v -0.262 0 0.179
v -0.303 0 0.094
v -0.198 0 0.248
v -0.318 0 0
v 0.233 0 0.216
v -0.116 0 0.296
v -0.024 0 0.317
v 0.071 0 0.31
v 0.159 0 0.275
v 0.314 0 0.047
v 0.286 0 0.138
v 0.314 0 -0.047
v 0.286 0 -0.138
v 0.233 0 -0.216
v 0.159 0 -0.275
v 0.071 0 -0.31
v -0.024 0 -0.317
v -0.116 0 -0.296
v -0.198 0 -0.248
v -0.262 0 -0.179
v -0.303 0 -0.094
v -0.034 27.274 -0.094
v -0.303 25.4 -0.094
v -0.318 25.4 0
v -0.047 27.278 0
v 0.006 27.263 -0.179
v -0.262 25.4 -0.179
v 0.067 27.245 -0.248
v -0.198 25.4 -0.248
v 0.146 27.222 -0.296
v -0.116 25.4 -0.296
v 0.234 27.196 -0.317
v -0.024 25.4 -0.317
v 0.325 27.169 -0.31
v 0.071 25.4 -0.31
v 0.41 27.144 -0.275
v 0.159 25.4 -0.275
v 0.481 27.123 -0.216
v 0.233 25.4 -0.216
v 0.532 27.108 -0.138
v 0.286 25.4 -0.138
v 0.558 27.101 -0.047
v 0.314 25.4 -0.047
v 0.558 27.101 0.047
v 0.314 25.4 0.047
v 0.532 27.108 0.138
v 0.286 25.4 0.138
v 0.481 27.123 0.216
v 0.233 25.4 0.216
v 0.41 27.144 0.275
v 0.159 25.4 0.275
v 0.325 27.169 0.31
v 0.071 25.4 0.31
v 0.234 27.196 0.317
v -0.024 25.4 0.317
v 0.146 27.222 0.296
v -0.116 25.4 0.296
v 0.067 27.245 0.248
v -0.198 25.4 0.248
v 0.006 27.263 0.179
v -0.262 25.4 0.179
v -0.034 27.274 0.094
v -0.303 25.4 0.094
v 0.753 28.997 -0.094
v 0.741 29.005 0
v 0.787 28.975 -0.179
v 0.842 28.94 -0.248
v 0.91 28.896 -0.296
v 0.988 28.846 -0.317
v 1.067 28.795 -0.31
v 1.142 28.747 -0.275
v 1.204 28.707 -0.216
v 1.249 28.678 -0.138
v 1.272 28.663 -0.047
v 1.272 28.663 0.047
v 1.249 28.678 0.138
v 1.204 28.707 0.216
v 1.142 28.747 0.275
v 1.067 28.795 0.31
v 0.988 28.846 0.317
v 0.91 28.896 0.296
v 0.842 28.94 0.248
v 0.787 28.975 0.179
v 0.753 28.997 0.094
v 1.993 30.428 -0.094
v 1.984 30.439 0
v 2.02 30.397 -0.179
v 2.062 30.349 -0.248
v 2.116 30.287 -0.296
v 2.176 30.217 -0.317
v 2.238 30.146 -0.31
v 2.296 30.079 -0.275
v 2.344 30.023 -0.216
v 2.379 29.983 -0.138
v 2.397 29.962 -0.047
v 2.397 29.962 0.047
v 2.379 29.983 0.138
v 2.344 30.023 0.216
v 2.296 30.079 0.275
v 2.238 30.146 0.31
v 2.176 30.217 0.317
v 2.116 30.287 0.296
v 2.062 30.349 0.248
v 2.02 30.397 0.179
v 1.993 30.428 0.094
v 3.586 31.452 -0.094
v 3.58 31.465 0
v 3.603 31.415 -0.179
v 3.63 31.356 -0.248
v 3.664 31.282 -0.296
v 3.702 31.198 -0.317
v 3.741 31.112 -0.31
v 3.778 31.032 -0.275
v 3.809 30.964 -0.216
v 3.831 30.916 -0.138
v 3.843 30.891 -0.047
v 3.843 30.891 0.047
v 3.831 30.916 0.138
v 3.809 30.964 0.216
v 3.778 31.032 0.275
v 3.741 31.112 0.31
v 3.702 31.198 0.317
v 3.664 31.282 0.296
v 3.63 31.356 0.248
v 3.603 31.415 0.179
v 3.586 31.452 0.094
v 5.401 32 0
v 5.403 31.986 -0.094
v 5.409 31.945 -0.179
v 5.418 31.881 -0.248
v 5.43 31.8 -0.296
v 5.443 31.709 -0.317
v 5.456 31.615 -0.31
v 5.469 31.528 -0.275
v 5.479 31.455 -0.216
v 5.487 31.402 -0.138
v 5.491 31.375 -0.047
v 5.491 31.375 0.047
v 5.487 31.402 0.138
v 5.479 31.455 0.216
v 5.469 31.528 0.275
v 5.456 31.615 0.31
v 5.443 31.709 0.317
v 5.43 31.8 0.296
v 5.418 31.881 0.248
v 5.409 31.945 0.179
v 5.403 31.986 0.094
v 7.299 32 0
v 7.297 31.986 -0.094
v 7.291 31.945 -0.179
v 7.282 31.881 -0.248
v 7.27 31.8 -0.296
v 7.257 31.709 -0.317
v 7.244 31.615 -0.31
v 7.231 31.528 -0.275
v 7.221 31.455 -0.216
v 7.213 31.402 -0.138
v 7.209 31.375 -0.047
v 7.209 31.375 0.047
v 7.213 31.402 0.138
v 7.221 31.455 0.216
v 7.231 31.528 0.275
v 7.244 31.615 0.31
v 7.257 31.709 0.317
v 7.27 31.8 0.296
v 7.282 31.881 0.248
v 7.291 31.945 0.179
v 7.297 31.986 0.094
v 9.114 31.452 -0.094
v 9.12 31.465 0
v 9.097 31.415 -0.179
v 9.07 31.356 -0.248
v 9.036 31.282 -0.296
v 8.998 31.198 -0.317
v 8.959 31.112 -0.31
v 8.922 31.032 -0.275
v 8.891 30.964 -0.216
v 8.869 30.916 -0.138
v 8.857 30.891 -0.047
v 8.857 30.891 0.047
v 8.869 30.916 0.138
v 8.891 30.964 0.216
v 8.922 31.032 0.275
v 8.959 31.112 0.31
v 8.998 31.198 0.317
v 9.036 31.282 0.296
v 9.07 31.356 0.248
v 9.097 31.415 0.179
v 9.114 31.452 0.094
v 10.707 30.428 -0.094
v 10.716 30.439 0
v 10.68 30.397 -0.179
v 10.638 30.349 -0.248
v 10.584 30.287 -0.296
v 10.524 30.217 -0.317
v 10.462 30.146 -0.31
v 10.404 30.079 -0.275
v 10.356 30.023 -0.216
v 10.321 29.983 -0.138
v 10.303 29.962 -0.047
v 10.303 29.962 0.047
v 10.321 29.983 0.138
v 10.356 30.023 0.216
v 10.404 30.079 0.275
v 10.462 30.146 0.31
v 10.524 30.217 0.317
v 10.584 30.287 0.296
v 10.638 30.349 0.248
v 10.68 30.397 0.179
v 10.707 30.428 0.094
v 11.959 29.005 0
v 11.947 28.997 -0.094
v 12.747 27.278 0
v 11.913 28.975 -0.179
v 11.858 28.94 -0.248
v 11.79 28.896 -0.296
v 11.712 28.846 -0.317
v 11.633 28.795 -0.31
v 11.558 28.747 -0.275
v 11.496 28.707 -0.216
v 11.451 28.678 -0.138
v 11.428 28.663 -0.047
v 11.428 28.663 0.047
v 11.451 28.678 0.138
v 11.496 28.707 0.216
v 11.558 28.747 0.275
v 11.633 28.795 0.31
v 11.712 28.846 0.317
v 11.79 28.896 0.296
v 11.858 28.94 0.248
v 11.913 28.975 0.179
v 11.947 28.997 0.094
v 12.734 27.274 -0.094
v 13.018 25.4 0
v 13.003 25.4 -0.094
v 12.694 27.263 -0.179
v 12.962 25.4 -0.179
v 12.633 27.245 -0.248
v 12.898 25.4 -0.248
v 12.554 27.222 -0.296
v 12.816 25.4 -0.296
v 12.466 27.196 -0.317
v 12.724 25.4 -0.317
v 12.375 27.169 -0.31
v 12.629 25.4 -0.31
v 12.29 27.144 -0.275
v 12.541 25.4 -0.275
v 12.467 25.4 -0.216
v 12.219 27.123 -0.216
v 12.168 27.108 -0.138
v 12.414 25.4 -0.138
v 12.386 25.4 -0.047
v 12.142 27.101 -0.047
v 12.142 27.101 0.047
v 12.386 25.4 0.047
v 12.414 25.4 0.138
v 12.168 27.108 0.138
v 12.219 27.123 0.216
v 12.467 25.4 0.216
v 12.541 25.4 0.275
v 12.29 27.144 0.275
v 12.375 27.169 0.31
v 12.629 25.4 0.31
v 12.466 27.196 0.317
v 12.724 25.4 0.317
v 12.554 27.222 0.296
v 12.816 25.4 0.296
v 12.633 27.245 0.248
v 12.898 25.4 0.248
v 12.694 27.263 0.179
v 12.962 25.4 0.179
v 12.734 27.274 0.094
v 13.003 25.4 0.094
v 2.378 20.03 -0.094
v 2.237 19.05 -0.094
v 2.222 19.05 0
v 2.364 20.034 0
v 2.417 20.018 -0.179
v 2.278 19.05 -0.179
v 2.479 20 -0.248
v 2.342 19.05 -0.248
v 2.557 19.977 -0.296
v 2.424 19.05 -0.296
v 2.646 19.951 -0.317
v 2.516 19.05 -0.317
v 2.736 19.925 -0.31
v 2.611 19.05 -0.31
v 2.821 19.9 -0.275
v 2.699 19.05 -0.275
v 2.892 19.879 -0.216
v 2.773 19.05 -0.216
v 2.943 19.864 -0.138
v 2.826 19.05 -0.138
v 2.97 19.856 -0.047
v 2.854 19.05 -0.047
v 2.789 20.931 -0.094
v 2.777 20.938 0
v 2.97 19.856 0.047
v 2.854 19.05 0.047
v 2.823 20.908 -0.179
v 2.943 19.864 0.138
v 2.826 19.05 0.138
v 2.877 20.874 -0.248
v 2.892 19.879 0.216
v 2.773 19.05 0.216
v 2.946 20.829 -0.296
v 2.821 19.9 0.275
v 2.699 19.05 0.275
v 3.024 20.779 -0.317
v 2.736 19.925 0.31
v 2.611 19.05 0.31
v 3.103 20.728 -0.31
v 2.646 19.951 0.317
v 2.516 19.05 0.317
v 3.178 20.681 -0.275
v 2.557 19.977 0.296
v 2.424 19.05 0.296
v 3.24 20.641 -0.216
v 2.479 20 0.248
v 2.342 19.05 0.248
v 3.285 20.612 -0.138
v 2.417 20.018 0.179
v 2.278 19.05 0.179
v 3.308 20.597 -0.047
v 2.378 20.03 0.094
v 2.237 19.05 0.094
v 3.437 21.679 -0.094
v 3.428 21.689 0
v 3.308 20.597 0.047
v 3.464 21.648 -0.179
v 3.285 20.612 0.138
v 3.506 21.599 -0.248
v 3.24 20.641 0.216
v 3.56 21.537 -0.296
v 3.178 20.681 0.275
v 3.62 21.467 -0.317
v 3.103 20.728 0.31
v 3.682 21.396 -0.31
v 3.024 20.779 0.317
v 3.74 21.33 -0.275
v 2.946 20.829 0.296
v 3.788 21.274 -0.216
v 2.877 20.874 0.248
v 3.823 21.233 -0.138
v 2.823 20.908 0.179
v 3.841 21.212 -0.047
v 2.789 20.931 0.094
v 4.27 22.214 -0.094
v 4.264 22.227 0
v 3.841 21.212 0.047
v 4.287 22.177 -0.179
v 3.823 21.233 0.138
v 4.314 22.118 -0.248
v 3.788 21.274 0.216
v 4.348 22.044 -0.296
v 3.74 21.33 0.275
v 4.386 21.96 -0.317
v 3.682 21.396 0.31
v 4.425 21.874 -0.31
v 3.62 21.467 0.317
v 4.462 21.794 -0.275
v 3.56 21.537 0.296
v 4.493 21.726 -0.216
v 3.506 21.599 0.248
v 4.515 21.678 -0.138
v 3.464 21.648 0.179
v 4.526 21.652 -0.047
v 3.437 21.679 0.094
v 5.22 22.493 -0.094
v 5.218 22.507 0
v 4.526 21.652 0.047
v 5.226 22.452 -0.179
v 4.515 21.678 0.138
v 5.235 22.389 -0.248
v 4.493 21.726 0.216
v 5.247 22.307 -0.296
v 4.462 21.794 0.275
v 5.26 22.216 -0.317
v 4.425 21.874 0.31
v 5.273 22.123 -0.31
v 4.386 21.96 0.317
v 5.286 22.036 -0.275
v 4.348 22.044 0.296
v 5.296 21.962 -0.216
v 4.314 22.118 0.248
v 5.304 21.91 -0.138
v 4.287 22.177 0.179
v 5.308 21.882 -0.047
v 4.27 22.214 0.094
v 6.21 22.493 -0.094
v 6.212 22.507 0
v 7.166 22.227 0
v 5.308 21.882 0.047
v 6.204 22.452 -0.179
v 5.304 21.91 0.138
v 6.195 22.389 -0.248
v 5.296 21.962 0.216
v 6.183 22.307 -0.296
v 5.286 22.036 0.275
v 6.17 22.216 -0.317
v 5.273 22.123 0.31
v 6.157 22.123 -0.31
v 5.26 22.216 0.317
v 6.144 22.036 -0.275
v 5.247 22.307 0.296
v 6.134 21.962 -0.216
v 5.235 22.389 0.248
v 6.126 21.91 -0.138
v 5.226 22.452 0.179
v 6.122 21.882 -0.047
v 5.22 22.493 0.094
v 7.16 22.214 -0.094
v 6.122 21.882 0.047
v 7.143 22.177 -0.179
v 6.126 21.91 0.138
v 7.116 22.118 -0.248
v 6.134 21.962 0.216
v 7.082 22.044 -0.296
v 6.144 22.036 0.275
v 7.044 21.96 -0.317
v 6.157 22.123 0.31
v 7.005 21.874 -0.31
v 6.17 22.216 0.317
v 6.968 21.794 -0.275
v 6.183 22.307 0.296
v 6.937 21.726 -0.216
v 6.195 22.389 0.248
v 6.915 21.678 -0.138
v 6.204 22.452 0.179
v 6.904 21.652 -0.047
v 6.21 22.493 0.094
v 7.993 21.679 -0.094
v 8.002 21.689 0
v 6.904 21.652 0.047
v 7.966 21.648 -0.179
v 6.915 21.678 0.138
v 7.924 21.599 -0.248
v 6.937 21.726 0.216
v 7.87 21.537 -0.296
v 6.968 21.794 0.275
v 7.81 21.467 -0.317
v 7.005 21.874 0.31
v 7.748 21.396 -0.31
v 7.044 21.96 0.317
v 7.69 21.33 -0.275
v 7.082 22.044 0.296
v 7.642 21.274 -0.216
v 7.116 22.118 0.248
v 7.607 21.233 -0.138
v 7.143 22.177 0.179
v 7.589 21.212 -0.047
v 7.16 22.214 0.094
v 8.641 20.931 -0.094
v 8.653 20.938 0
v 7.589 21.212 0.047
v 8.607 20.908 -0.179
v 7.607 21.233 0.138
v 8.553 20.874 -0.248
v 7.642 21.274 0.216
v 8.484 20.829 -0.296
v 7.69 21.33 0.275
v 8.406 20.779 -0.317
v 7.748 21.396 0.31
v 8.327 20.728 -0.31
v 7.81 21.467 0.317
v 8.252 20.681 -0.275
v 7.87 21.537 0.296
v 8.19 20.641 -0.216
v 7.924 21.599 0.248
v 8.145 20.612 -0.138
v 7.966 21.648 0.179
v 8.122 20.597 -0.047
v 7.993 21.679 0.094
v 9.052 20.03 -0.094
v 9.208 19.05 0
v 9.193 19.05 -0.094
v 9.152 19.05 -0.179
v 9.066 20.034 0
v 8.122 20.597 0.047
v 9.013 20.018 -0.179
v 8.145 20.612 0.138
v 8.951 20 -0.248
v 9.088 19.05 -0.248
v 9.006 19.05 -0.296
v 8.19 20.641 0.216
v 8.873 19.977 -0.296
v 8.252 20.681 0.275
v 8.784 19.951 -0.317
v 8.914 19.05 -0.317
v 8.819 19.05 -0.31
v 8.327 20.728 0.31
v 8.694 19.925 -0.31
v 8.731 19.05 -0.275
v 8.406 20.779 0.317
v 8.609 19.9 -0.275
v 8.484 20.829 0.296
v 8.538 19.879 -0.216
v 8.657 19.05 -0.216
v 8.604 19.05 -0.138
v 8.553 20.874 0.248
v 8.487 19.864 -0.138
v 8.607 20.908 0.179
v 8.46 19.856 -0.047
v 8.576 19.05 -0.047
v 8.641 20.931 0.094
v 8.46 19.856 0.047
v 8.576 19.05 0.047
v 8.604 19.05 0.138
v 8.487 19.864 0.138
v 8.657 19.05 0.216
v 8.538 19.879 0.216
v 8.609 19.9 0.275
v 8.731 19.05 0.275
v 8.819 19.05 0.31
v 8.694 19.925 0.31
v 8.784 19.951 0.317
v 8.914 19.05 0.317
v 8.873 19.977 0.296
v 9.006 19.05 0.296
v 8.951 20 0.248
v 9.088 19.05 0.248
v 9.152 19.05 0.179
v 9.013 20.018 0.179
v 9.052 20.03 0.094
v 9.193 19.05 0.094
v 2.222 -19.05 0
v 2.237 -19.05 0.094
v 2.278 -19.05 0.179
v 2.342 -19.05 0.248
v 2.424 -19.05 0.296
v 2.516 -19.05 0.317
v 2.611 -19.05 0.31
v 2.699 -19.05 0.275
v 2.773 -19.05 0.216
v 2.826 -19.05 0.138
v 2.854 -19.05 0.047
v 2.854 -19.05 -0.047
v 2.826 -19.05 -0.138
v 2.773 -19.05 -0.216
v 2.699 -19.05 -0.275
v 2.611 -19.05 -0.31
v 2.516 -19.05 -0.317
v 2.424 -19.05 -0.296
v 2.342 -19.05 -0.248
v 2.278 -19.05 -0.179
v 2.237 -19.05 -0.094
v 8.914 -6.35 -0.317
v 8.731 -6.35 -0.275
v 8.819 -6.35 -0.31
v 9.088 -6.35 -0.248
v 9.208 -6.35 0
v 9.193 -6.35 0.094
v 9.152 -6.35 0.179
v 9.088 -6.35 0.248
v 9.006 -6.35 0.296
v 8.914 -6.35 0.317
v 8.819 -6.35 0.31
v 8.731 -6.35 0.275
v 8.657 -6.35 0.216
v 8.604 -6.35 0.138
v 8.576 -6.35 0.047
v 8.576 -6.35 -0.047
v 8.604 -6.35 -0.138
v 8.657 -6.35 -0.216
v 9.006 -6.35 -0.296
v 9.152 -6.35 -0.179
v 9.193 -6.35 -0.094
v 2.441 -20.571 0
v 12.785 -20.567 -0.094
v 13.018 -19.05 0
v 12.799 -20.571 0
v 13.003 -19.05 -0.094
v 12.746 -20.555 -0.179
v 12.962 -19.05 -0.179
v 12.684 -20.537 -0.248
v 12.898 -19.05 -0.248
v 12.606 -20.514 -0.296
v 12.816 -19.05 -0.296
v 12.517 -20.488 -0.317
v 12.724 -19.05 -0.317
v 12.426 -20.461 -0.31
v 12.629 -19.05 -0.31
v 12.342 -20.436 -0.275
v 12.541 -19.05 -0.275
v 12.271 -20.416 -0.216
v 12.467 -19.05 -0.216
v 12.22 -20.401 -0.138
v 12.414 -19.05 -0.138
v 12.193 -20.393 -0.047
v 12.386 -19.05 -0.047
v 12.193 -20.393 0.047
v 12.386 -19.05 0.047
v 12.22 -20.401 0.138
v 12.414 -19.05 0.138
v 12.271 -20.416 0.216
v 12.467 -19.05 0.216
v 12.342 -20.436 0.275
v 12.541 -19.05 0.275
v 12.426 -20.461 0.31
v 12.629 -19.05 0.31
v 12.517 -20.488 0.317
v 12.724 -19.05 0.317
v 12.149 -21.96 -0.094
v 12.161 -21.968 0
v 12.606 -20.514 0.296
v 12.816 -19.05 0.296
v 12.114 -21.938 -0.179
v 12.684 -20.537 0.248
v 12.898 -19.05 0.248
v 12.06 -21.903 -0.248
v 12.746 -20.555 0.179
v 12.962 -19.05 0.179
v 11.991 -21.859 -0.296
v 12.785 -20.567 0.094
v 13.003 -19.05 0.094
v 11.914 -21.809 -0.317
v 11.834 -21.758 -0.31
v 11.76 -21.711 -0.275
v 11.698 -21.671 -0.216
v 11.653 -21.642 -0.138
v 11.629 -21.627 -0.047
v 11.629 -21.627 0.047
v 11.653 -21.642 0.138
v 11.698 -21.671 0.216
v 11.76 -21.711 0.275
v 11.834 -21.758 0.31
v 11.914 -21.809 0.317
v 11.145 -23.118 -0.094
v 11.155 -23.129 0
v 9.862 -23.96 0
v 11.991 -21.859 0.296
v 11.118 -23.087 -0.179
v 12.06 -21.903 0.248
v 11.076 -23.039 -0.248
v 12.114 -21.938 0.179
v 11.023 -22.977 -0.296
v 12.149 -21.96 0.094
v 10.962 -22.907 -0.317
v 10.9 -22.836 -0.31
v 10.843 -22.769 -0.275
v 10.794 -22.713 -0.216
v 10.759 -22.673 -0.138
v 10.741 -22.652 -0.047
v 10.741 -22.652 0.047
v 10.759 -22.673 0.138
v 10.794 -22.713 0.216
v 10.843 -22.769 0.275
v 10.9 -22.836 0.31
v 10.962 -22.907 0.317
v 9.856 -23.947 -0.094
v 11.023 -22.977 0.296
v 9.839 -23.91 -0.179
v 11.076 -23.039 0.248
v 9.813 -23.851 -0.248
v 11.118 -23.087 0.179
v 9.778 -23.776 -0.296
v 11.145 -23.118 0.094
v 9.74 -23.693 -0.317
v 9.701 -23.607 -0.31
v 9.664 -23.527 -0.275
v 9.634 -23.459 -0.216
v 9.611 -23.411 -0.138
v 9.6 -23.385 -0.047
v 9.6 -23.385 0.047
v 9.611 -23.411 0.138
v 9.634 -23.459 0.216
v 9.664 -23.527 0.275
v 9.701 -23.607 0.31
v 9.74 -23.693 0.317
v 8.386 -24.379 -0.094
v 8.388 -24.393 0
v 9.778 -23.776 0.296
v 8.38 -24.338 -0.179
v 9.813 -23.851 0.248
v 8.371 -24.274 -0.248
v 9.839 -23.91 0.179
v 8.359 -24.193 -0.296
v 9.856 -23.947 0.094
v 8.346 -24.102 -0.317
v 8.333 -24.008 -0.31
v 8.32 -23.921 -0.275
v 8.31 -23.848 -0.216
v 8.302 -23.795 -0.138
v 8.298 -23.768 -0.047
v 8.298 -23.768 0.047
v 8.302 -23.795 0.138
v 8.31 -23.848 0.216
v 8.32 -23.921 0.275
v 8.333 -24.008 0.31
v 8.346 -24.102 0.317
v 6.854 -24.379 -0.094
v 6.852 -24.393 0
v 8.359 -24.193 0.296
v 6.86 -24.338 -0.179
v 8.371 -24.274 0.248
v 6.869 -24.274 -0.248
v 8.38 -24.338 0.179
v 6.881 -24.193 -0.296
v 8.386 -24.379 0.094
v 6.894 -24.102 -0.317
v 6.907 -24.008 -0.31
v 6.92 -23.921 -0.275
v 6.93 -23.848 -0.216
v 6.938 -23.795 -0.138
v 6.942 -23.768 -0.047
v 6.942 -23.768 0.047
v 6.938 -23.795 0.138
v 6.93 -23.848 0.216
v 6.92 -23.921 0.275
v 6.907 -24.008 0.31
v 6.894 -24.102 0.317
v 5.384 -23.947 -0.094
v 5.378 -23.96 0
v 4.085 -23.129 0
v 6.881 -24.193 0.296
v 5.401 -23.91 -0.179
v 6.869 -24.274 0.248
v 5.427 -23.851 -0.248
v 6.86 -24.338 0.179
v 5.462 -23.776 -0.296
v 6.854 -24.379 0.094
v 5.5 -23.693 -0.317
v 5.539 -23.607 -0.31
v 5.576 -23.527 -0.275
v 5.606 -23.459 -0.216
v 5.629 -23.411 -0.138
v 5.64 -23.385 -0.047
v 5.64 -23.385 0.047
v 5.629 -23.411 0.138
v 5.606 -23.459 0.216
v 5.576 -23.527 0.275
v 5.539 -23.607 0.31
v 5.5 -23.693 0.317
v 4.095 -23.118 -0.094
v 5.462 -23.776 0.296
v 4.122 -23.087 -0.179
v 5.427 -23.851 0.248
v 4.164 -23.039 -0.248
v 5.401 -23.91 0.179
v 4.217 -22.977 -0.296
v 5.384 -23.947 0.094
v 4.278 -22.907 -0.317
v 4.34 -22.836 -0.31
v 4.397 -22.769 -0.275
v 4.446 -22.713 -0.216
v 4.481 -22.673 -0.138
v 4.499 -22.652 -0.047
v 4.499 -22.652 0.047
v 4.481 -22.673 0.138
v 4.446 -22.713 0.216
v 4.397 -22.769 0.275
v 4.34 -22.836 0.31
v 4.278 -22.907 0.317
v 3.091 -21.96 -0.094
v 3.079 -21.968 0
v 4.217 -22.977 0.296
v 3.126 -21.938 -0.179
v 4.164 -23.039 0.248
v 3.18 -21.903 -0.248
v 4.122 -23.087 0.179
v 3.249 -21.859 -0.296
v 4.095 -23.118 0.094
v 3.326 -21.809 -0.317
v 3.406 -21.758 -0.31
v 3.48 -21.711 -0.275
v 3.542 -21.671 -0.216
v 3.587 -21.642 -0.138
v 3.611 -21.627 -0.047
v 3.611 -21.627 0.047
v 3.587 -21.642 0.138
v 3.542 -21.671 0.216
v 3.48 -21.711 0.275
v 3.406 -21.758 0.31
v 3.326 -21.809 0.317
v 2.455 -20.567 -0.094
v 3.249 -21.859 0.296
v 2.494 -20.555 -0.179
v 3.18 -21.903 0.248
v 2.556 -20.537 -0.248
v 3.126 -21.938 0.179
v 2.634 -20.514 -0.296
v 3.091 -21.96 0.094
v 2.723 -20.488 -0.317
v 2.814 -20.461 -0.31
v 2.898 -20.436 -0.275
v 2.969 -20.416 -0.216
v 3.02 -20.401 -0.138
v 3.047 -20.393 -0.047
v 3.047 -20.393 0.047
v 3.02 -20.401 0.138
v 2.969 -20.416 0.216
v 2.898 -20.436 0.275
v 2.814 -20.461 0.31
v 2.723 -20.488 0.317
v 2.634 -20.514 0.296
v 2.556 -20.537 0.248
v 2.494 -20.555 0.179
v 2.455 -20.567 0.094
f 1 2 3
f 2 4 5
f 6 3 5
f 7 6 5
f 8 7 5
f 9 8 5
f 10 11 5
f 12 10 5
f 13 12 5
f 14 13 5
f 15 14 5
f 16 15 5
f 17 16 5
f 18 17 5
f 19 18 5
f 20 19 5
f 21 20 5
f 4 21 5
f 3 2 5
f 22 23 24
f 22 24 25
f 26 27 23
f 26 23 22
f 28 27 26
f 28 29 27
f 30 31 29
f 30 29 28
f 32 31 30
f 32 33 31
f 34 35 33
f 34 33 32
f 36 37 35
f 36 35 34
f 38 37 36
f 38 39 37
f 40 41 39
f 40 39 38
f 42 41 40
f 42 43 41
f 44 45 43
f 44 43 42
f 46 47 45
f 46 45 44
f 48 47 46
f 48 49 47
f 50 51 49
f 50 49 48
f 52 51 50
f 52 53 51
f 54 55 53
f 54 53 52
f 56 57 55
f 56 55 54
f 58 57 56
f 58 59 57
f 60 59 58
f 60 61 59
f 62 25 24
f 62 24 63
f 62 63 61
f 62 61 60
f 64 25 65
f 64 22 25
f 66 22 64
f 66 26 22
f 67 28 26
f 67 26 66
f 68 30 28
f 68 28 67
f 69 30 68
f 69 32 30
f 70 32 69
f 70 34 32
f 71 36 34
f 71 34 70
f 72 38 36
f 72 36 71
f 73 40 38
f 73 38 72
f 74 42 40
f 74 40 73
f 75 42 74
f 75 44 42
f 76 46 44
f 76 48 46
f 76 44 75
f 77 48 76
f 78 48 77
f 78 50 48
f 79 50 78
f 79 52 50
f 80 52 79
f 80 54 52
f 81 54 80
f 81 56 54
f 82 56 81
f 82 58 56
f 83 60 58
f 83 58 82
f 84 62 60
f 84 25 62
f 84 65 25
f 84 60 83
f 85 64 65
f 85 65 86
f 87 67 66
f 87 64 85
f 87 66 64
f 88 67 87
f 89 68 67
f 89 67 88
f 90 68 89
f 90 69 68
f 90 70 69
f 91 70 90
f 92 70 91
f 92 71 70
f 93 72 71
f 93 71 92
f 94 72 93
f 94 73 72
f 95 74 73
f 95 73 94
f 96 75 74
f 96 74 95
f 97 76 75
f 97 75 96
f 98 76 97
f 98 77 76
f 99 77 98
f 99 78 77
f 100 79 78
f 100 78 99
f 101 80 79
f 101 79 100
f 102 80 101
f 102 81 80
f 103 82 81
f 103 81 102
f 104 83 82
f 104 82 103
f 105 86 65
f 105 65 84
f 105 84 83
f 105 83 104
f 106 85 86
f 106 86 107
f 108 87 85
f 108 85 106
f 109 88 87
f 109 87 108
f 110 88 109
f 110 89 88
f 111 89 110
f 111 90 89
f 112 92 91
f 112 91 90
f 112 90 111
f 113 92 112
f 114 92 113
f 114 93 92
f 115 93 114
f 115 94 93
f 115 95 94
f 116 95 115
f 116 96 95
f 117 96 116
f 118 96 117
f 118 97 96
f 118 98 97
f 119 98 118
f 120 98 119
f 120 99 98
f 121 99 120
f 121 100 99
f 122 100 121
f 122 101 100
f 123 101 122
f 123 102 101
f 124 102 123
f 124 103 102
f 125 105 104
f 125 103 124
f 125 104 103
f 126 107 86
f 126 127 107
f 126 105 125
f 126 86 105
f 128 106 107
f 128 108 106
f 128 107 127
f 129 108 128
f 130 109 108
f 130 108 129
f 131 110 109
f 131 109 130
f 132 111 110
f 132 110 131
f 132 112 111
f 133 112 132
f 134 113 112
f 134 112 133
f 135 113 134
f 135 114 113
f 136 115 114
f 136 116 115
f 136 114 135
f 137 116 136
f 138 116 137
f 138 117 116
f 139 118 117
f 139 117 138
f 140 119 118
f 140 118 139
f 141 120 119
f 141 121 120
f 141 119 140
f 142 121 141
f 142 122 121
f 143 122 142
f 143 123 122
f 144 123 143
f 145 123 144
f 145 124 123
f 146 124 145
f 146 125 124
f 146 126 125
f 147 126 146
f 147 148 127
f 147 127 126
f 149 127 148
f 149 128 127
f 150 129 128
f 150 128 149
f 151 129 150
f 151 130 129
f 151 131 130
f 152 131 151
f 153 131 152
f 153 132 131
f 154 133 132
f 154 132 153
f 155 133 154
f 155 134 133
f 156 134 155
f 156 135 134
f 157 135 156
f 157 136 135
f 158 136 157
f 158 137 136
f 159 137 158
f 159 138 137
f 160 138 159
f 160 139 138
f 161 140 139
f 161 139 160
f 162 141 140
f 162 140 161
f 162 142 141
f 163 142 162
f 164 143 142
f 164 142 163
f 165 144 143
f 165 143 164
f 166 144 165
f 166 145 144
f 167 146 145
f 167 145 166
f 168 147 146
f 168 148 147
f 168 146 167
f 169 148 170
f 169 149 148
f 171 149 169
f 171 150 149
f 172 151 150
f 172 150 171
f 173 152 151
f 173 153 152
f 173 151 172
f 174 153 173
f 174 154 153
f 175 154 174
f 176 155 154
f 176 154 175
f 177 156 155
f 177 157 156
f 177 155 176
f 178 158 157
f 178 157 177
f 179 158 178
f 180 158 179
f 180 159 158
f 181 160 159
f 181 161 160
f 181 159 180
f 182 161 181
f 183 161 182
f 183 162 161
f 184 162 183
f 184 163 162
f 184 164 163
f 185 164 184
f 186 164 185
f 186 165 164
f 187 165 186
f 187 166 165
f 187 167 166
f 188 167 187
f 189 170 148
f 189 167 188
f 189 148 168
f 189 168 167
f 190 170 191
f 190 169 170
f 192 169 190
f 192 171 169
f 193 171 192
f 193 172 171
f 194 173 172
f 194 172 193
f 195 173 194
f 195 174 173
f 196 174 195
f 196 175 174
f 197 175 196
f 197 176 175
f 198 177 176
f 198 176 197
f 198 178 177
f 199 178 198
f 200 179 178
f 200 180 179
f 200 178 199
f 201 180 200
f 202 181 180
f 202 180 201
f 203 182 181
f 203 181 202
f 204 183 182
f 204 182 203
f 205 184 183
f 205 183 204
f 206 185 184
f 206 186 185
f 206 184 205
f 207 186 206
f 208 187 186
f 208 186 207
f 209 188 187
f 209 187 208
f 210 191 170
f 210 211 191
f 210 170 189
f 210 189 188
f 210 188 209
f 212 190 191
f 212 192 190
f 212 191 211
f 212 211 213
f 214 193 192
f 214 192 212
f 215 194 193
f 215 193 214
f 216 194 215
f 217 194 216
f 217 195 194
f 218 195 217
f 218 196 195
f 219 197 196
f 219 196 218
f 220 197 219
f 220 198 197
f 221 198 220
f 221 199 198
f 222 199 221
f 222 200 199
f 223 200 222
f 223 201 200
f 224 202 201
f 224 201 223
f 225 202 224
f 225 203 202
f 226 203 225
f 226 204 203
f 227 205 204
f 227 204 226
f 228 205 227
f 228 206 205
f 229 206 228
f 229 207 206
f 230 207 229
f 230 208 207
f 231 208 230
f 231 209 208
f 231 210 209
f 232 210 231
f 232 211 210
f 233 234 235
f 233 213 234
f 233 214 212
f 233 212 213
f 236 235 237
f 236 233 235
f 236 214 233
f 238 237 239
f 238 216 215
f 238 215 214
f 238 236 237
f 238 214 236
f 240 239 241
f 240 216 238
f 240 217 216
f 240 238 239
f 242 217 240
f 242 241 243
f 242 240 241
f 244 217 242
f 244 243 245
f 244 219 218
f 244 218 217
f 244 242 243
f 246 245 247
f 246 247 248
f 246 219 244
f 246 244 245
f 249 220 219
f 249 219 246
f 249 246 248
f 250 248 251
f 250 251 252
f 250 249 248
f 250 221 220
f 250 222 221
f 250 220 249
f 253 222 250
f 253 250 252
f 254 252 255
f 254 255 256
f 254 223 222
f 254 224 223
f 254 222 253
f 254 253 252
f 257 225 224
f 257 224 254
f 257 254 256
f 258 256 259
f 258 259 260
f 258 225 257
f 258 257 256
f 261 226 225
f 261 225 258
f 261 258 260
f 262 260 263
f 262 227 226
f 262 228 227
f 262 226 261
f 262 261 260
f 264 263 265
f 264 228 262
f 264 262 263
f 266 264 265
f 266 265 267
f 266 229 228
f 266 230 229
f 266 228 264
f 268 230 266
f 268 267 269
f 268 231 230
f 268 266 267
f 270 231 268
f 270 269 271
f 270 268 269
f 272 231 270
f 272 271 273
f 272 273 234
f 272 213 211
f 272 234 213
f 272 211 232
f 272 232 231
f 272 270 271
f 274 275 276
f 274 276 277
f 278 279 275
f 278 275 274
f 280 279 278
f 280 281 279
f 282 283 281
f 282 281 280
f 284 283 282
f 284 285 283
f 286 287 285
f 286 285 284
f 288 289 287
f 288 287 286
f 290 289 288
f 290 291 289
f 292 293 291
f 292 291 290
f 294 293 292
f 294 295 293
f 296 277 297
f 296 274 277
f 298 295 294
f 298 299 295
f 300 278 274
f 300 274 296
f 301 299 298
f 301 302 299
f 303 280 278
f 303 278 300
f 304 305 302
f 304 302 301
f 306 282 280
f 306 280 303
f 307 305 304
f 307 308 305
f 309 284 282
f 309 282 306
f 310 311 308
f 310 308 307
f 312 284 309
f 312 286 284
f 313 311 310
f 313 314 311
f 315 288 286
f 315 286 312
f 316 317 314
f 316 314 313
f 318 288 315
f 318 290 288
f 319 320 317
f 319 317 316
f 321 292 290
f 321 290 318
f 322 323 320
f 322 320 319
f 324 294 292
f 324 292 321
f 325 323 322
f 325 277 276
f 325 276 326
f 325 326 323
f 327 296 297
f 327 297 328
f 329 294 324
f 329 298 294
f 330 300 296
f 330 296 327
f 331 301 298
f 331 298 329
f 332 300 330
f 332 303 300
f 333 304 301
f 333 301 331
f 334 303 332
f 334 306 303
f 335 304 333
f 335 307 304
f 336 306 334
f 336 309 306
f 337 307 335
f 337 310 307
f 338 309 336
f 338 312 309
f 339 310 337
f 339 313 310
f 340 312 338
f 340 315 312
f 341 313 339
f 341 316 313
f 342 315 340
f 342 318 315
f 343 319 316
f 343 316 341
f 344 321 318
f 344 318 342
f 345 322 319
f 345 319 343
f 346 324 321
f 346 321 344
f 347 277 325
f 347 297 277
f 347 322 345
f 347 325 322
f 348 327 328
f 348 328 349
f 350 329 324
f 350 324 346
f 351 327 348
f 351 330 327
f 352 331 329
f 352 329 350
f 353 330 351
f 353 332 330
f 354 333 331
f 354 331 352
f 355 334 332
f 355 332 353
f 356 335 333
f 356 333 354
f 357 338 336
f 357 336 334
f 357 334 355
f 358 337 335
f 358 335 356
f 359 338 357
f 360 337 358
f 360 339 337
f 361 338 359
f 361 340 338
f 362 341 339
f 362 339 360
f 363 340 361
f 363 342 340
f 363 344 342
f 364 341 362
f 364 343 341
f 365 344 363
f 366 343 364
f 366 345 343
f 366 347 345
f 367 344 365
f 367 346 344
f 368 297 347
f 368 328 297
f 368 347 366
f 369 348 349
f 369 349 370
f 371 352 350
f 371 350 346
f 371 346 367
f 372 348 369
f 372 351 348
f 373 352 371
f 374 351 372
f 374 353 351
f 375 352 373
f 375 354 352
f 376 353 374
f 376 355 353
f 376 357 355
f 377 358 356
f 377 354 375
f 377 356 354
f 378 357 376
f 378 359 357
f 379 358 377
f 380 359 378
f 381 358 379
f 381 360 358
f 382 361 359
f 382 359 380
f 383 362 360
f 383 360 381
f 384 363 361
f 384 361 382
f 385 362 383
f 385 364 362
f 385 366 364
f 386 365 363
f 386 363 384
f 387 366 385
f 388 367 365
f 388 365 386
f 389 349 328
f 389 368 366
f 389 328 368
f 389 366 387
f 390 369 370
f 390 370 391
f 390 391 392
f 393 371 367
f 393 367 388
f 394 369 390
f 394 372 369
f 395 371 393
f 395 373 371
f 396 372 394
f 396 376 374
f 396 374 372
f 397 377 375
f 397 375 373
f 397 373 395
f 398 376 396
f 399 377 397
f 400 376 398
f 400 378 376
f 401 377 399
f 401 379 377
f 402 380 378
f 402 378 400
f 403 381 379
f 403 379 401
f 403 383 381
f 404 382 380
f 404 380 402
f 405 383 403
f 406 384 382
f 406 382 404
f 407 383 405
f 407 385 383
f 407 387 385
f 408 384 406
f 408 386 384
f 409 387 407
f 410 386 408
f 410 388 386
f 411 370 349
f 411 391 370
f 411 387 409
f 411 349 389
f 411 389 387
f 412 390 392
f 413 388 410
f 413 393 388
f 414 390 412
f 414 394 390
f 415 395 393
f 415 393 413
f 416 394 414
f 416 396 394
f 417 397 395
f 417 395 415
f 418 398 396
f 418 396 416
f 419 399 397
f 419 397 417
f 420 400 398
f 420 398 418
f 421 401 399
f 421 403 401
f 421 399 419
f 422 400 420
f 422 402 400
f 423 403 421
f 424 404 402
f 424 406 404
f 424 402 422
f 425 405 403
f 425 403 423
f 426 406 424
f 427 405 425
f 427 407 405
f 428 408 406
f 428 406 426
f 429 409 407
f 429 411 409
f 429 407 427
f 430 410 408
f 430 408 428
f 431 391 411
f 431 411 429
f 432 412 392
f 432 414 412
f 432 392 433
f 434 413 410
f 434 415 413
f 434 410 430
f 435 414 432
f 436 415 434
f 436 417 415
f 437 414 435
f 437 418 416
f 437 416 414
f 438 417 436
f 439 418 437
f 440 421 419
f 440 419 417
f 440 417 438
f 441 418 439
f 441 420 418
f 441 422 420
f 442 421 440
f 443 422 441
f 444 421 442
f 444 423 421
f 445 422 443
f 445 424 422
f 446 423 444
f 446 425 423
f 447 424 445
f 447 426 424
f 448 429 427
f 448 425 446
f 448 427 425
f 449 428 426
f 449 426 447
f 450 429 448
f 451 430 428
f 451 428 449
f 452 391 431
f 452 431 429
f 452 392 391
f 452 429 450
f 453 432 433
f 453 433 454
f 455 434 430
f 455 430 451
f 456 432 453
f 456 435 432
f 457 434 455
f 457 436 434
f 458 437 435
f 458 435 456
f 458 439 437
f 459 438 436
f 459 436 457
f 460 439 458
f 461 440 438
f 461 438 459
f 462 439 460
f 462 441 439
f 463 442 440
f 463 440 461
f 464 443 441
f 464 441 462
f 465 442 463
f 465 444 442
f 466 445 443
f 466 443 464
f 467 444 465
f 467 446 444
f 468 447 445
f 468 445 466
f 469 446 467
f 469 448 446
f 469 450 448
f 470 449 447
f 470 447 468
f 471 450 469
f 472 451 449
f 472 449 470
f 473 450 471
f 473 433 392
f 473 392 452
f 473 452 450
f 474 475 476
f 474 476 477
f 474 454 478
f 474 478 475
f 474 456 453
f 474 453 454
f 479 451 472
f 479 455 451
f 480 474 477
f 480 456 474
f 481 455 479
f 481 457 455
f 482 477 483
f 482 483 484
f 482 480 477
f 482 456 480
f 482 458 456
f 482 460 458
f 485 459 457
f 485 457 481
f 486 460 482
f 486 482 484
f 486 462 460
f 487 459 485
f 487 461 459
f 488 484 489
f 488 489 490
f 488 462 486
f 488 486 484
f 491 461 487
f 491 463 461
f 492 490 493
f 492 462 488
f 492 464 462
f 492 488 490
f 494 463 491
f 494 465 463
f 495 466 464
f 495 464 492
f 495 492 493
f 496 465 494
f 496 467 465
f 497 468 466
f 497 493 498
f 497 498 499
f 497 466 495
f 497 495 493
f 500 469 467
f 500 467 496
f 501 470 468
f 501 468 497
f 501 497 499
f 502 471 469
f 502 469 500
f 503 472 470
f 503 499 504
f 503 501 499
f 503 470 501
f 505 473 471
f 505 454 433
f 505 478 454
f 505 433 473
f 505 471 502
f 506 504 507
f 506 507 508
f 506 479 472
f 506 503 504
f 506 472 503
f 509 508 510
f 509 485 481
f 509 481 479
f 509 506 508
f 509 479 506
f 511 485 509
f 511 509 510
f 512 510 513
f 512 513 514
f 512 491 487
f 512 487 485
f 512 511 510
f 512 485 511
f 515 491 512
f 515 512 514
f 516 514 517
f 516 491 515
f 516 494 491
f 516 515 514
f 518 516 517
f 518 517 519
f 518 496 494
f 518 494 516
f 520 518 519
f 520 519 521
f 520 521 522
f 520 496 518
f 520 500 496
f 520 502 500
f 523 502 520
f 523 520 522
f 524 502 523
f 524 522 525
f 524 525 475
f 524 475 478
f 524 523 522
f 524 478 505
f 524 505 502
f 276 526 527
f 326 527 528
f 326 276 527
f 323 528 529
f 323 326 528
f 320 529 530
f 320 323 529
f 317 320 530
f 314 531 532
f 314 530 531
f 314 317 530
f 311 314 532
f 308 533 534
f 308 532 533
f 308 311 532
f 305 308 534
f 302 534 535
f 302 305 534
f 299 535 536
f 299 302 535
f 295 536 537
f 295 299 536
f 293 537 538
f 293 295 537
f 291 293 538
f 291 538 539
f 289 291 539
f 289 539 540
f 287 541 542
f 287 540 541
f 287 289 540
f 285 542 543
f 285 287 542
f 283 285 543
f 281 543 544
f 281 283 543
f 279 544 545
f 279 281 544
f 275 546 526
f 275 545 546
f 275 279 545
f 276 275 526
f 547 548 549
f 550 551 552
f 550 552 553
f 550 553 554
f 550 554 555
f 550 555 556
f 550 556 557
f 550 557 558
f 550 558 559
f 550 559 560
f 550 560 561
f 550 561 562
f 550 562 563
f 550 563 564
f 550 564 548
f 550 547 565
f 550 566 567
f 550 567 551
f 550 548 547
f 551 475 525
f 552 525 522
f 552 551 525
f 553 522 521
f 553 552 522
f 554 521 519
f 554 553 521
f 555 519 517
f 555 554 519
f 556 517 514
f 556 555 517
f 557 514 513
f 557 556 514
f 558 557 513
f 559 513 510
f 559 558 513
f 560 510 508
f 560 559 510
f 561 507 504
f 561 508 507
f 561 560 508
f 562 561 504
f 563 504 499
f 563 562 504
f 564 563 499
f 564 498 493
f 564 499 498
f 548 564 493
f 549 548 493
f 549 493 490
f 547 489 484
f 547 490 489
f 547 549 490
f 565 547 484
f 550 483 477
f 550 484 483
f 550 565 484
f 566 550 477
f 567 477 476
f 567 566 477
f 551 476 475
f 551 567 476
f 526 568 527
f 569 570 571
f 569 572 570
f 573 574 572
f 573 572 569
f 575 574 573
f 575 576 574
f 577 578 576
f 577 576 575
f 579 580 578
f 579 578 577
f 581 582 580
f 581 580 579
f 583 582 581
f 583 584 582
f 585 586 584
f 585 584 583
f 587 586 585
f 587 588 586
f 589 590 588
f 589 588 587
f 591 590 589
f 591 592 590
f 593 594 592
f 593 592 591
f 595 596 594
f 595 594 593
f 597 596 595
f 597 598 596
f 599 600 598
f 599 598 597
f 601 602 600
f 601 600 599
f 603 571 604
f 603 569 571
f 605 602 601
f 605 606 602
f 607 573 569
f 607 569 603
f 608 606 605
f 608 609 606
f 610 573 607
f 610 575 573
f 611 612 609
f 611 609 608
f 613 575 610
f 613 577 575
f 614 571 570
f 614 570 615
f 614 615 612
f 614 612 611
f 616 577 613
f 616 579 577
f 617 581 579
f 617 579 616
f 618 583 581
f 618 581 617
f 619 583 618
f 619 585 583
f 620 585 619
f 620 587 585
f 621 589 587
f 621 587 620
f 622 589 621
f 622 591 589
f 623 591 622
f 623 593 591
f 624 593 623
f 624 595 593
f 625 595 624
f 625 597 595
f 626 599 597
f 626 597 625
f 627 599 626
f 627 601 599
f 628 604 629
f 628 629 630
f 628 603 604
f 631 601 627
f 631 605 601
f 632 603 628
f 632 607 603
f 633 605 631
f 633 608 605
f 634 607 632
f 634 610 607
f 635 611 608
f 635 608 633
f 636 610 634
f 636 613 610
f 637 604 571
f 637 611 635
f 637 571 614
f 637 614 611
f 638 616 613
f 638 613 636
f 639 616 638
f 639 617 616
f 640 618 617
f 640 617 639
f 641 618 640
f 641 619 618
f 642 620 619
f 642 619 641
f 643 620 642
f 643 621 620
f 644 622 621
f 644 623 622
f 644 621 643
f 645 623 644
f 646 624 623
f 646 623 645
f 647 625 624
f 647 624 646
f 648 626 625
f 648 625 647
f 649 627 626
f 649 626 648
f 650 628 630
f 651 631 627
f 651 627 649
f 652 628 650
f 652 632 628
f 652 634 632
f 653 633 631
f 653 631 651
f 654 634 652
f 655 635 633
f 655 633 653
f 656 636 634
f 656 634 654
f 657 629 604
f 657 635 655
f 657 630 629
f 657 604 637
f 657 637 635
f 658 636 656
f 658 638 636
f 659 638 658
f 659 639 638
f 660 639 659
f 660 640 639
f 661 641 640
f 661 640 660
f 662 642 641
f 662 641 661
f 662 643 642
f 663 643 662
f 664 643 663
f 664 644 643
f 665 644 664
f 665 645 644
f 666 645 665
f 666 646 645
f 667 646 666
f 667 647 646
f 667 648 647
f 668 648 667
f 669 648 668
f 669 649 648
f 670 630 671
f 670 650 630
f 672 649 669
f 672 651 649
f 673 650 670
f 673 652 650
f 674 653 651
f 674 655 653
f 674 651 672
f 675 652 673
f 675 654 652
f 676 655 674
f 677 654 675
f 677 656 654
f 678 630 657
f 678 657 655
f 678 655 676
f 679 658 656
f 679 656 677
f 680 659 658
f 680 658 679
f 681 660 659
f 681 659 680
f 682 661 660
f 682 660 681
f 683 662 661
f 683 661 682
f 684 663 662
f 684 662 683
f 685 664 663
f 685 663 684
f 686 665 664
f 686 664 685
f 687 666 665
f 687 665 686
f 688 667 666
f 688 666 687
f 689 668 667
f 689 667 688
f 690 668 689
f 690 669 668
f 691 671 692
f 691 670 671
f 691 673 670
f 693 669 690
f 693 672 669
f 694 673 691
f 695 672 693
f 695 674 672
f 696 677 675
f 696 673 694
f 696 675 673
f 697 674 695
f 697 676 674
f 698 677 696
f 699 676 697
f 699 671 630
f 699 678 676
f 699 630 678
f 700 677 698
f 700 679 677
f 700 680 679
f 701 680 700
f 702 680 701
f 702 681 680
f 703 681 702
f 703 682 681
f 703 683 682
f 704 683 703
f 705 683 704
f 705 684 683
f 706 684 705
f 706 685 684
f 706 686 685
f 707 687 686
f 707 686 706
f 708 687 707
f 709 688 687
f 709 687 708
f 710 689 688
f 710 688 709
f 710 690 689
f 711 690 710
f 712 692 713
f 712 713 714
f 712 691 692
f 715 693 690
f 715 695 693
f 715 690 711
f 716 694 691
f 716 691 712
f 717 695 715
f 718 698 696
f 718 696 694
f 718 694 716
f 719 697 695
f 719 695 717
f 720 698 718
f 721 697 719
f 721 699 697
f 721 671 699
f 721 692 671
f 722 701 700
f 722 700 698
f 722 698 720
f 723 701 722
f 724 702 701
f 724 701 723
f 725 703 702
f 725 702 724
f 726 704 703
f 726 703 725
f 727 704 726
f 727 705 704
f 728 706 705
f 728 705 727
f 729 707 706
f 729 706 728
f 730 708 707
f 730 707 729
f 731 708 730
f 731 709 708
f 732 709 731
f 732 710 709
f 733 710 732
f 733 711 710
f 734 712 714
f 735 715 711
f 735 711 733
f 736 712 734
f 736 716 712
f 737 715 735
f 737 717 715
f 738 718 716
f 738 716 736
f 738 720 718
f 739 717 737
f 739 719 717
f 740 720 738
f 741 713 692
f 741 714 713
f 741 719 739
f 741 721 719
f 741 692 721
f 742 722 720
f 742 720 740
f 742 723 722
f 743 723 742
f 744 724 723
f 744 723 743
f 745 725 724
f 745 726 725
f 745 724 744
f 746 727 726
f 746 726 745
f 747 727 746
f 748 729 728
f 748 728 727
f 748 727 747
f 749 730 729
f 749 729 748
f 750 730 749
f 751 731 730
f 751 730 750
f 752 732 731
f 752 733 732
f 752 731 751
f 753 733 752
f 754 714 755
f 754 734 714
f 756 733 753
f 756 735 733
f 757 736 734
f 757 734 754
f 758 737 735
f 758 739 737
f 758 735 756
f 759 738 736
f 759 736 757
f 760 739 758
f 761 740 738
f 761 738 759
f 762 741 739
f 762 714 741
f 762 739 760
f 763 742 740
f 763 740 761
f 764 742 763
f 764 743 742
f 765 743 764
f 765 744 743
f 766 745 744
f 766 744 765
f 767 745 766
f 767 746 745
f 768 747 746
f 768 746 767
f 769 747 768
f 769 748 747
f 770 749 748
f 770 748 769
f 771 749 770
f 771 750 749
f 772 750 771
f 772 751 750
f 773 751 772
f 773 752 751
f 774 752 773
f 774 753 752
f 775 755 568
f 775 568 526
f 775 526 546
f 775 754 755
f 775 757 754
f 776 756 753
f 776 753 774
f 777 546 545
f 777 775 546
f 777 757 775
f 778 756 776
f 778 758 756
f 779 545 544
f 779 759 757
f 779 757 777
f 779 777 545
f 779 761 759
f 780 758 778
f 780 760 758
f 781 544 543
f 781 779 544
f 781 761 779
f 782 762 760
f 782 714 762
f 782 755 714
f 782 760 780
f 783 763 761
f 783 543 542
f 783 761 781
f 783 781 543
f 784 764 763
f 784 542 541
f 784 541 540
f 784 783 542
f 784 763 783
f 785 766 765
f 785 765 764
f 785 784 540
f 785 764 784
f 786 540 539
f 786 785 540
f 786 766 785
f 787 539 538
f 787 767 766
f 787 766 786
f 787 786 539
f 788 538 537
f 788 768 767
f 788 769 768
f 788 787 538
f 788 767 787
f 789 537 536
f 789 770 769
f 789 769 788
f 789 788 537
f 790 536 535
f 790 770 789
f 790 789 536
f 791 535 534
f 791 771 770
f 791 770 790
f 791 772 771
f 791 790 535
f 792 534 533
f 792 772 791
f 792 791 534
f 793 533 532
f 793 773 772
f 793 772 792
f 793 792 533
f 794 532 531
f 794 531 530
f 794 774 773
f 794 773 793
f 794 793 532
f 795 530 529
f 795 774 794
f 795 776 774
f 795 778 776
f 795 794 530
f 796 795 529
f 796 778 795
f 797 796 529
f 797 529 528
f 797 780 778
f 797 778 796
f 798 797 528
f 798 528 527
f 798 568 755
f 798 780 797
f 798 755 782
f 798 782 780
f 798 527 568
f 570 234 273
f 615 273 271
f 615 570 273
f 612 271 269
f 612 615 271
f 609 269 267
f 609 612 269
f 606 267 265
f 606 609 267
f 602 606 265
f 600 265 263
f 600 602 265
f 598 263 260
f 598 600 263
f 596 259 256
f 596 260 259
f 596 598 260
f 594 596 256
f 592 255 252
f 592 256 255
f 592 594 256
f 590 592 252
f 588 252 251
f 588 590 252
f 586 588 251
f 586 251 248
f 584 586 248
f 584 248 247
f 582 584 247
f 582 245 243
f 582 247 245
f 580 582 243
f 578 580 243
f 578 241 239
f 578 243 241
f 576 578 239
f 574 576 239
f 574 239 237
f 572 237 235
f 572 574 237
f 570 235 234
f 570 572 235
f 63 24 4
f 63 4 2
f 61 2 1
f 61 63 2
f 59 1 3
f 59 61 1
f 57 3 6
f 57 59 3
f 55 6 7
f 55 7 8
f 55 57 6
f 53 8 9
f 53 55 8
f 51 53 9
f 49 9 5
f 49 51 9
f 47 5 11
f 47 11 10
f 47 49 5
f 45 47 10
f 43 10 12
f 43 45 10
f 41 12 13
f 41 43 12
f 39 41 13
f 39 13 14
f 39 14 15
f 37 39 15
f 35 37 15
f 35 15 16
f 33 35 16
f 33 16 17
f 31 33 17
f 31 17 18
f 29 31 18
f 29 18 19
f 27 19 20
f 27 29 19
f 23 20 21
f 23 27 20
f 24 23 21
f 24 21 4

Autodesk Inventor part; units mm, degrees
ref_plane "YZ Plane" through (0, 0, 0) normal (1, 0, 0) x (0, 1, 0)
ref_plane "XZ Plane" through (0, 0, 0) normal (0, 1, 0) x (-1, 0, 0)
ref_plane "XY Plane" through (0, 0, 0) normal (0, 0, 1) x (1, 0, 0)
sketch "Sketch1" plane through (0, 0, 0) normal (0, 0, 1) x (1, 0, 0)
  line L0 (0, 0) -> (0, 25.4)
  arc A0 (12.7, 25.4) -> (0, 25.4) centre (6.35, 25.4) ccw
  line L1 (12.7, 25.4) -> (12.7, -19.05)
  arc A1 (2.54, -19.05) -> (12.7, -19.05) centre (7.62, -19.05) ccw
  line L2 (2.54, -19.05) -> (2.54, 19.05)
  arc A2 (8.89, 19.05) -> (2.54, 19.05) centre (5.715, 19.05) ccw
  line L3 (8.89, 19.05) -> (8.89, -6.35)
  dimension "d0" = 25.4
  dimension "d2" = 12.7
  dimension "d3" = 6.35
  dimension "d4" = 44.45
  dimension "d5" = 10.16
  dimension "d7" = 5.08
  dimension "d8" = 38.1
  dimension "d9" = 6.35
  dimension "d10" = 25.4
sketch "Sketch2" plane through (0, 0, 0) normal (0, 1, 0) x (-1, 0, 0)
  circle A0 centre (0, 0) radius 0.3175
  dimension "d11" = 0.635
sweep "Sweep1" add profiles "Sketch2" path "Sketch1"
properties part number "Paper Clip"
